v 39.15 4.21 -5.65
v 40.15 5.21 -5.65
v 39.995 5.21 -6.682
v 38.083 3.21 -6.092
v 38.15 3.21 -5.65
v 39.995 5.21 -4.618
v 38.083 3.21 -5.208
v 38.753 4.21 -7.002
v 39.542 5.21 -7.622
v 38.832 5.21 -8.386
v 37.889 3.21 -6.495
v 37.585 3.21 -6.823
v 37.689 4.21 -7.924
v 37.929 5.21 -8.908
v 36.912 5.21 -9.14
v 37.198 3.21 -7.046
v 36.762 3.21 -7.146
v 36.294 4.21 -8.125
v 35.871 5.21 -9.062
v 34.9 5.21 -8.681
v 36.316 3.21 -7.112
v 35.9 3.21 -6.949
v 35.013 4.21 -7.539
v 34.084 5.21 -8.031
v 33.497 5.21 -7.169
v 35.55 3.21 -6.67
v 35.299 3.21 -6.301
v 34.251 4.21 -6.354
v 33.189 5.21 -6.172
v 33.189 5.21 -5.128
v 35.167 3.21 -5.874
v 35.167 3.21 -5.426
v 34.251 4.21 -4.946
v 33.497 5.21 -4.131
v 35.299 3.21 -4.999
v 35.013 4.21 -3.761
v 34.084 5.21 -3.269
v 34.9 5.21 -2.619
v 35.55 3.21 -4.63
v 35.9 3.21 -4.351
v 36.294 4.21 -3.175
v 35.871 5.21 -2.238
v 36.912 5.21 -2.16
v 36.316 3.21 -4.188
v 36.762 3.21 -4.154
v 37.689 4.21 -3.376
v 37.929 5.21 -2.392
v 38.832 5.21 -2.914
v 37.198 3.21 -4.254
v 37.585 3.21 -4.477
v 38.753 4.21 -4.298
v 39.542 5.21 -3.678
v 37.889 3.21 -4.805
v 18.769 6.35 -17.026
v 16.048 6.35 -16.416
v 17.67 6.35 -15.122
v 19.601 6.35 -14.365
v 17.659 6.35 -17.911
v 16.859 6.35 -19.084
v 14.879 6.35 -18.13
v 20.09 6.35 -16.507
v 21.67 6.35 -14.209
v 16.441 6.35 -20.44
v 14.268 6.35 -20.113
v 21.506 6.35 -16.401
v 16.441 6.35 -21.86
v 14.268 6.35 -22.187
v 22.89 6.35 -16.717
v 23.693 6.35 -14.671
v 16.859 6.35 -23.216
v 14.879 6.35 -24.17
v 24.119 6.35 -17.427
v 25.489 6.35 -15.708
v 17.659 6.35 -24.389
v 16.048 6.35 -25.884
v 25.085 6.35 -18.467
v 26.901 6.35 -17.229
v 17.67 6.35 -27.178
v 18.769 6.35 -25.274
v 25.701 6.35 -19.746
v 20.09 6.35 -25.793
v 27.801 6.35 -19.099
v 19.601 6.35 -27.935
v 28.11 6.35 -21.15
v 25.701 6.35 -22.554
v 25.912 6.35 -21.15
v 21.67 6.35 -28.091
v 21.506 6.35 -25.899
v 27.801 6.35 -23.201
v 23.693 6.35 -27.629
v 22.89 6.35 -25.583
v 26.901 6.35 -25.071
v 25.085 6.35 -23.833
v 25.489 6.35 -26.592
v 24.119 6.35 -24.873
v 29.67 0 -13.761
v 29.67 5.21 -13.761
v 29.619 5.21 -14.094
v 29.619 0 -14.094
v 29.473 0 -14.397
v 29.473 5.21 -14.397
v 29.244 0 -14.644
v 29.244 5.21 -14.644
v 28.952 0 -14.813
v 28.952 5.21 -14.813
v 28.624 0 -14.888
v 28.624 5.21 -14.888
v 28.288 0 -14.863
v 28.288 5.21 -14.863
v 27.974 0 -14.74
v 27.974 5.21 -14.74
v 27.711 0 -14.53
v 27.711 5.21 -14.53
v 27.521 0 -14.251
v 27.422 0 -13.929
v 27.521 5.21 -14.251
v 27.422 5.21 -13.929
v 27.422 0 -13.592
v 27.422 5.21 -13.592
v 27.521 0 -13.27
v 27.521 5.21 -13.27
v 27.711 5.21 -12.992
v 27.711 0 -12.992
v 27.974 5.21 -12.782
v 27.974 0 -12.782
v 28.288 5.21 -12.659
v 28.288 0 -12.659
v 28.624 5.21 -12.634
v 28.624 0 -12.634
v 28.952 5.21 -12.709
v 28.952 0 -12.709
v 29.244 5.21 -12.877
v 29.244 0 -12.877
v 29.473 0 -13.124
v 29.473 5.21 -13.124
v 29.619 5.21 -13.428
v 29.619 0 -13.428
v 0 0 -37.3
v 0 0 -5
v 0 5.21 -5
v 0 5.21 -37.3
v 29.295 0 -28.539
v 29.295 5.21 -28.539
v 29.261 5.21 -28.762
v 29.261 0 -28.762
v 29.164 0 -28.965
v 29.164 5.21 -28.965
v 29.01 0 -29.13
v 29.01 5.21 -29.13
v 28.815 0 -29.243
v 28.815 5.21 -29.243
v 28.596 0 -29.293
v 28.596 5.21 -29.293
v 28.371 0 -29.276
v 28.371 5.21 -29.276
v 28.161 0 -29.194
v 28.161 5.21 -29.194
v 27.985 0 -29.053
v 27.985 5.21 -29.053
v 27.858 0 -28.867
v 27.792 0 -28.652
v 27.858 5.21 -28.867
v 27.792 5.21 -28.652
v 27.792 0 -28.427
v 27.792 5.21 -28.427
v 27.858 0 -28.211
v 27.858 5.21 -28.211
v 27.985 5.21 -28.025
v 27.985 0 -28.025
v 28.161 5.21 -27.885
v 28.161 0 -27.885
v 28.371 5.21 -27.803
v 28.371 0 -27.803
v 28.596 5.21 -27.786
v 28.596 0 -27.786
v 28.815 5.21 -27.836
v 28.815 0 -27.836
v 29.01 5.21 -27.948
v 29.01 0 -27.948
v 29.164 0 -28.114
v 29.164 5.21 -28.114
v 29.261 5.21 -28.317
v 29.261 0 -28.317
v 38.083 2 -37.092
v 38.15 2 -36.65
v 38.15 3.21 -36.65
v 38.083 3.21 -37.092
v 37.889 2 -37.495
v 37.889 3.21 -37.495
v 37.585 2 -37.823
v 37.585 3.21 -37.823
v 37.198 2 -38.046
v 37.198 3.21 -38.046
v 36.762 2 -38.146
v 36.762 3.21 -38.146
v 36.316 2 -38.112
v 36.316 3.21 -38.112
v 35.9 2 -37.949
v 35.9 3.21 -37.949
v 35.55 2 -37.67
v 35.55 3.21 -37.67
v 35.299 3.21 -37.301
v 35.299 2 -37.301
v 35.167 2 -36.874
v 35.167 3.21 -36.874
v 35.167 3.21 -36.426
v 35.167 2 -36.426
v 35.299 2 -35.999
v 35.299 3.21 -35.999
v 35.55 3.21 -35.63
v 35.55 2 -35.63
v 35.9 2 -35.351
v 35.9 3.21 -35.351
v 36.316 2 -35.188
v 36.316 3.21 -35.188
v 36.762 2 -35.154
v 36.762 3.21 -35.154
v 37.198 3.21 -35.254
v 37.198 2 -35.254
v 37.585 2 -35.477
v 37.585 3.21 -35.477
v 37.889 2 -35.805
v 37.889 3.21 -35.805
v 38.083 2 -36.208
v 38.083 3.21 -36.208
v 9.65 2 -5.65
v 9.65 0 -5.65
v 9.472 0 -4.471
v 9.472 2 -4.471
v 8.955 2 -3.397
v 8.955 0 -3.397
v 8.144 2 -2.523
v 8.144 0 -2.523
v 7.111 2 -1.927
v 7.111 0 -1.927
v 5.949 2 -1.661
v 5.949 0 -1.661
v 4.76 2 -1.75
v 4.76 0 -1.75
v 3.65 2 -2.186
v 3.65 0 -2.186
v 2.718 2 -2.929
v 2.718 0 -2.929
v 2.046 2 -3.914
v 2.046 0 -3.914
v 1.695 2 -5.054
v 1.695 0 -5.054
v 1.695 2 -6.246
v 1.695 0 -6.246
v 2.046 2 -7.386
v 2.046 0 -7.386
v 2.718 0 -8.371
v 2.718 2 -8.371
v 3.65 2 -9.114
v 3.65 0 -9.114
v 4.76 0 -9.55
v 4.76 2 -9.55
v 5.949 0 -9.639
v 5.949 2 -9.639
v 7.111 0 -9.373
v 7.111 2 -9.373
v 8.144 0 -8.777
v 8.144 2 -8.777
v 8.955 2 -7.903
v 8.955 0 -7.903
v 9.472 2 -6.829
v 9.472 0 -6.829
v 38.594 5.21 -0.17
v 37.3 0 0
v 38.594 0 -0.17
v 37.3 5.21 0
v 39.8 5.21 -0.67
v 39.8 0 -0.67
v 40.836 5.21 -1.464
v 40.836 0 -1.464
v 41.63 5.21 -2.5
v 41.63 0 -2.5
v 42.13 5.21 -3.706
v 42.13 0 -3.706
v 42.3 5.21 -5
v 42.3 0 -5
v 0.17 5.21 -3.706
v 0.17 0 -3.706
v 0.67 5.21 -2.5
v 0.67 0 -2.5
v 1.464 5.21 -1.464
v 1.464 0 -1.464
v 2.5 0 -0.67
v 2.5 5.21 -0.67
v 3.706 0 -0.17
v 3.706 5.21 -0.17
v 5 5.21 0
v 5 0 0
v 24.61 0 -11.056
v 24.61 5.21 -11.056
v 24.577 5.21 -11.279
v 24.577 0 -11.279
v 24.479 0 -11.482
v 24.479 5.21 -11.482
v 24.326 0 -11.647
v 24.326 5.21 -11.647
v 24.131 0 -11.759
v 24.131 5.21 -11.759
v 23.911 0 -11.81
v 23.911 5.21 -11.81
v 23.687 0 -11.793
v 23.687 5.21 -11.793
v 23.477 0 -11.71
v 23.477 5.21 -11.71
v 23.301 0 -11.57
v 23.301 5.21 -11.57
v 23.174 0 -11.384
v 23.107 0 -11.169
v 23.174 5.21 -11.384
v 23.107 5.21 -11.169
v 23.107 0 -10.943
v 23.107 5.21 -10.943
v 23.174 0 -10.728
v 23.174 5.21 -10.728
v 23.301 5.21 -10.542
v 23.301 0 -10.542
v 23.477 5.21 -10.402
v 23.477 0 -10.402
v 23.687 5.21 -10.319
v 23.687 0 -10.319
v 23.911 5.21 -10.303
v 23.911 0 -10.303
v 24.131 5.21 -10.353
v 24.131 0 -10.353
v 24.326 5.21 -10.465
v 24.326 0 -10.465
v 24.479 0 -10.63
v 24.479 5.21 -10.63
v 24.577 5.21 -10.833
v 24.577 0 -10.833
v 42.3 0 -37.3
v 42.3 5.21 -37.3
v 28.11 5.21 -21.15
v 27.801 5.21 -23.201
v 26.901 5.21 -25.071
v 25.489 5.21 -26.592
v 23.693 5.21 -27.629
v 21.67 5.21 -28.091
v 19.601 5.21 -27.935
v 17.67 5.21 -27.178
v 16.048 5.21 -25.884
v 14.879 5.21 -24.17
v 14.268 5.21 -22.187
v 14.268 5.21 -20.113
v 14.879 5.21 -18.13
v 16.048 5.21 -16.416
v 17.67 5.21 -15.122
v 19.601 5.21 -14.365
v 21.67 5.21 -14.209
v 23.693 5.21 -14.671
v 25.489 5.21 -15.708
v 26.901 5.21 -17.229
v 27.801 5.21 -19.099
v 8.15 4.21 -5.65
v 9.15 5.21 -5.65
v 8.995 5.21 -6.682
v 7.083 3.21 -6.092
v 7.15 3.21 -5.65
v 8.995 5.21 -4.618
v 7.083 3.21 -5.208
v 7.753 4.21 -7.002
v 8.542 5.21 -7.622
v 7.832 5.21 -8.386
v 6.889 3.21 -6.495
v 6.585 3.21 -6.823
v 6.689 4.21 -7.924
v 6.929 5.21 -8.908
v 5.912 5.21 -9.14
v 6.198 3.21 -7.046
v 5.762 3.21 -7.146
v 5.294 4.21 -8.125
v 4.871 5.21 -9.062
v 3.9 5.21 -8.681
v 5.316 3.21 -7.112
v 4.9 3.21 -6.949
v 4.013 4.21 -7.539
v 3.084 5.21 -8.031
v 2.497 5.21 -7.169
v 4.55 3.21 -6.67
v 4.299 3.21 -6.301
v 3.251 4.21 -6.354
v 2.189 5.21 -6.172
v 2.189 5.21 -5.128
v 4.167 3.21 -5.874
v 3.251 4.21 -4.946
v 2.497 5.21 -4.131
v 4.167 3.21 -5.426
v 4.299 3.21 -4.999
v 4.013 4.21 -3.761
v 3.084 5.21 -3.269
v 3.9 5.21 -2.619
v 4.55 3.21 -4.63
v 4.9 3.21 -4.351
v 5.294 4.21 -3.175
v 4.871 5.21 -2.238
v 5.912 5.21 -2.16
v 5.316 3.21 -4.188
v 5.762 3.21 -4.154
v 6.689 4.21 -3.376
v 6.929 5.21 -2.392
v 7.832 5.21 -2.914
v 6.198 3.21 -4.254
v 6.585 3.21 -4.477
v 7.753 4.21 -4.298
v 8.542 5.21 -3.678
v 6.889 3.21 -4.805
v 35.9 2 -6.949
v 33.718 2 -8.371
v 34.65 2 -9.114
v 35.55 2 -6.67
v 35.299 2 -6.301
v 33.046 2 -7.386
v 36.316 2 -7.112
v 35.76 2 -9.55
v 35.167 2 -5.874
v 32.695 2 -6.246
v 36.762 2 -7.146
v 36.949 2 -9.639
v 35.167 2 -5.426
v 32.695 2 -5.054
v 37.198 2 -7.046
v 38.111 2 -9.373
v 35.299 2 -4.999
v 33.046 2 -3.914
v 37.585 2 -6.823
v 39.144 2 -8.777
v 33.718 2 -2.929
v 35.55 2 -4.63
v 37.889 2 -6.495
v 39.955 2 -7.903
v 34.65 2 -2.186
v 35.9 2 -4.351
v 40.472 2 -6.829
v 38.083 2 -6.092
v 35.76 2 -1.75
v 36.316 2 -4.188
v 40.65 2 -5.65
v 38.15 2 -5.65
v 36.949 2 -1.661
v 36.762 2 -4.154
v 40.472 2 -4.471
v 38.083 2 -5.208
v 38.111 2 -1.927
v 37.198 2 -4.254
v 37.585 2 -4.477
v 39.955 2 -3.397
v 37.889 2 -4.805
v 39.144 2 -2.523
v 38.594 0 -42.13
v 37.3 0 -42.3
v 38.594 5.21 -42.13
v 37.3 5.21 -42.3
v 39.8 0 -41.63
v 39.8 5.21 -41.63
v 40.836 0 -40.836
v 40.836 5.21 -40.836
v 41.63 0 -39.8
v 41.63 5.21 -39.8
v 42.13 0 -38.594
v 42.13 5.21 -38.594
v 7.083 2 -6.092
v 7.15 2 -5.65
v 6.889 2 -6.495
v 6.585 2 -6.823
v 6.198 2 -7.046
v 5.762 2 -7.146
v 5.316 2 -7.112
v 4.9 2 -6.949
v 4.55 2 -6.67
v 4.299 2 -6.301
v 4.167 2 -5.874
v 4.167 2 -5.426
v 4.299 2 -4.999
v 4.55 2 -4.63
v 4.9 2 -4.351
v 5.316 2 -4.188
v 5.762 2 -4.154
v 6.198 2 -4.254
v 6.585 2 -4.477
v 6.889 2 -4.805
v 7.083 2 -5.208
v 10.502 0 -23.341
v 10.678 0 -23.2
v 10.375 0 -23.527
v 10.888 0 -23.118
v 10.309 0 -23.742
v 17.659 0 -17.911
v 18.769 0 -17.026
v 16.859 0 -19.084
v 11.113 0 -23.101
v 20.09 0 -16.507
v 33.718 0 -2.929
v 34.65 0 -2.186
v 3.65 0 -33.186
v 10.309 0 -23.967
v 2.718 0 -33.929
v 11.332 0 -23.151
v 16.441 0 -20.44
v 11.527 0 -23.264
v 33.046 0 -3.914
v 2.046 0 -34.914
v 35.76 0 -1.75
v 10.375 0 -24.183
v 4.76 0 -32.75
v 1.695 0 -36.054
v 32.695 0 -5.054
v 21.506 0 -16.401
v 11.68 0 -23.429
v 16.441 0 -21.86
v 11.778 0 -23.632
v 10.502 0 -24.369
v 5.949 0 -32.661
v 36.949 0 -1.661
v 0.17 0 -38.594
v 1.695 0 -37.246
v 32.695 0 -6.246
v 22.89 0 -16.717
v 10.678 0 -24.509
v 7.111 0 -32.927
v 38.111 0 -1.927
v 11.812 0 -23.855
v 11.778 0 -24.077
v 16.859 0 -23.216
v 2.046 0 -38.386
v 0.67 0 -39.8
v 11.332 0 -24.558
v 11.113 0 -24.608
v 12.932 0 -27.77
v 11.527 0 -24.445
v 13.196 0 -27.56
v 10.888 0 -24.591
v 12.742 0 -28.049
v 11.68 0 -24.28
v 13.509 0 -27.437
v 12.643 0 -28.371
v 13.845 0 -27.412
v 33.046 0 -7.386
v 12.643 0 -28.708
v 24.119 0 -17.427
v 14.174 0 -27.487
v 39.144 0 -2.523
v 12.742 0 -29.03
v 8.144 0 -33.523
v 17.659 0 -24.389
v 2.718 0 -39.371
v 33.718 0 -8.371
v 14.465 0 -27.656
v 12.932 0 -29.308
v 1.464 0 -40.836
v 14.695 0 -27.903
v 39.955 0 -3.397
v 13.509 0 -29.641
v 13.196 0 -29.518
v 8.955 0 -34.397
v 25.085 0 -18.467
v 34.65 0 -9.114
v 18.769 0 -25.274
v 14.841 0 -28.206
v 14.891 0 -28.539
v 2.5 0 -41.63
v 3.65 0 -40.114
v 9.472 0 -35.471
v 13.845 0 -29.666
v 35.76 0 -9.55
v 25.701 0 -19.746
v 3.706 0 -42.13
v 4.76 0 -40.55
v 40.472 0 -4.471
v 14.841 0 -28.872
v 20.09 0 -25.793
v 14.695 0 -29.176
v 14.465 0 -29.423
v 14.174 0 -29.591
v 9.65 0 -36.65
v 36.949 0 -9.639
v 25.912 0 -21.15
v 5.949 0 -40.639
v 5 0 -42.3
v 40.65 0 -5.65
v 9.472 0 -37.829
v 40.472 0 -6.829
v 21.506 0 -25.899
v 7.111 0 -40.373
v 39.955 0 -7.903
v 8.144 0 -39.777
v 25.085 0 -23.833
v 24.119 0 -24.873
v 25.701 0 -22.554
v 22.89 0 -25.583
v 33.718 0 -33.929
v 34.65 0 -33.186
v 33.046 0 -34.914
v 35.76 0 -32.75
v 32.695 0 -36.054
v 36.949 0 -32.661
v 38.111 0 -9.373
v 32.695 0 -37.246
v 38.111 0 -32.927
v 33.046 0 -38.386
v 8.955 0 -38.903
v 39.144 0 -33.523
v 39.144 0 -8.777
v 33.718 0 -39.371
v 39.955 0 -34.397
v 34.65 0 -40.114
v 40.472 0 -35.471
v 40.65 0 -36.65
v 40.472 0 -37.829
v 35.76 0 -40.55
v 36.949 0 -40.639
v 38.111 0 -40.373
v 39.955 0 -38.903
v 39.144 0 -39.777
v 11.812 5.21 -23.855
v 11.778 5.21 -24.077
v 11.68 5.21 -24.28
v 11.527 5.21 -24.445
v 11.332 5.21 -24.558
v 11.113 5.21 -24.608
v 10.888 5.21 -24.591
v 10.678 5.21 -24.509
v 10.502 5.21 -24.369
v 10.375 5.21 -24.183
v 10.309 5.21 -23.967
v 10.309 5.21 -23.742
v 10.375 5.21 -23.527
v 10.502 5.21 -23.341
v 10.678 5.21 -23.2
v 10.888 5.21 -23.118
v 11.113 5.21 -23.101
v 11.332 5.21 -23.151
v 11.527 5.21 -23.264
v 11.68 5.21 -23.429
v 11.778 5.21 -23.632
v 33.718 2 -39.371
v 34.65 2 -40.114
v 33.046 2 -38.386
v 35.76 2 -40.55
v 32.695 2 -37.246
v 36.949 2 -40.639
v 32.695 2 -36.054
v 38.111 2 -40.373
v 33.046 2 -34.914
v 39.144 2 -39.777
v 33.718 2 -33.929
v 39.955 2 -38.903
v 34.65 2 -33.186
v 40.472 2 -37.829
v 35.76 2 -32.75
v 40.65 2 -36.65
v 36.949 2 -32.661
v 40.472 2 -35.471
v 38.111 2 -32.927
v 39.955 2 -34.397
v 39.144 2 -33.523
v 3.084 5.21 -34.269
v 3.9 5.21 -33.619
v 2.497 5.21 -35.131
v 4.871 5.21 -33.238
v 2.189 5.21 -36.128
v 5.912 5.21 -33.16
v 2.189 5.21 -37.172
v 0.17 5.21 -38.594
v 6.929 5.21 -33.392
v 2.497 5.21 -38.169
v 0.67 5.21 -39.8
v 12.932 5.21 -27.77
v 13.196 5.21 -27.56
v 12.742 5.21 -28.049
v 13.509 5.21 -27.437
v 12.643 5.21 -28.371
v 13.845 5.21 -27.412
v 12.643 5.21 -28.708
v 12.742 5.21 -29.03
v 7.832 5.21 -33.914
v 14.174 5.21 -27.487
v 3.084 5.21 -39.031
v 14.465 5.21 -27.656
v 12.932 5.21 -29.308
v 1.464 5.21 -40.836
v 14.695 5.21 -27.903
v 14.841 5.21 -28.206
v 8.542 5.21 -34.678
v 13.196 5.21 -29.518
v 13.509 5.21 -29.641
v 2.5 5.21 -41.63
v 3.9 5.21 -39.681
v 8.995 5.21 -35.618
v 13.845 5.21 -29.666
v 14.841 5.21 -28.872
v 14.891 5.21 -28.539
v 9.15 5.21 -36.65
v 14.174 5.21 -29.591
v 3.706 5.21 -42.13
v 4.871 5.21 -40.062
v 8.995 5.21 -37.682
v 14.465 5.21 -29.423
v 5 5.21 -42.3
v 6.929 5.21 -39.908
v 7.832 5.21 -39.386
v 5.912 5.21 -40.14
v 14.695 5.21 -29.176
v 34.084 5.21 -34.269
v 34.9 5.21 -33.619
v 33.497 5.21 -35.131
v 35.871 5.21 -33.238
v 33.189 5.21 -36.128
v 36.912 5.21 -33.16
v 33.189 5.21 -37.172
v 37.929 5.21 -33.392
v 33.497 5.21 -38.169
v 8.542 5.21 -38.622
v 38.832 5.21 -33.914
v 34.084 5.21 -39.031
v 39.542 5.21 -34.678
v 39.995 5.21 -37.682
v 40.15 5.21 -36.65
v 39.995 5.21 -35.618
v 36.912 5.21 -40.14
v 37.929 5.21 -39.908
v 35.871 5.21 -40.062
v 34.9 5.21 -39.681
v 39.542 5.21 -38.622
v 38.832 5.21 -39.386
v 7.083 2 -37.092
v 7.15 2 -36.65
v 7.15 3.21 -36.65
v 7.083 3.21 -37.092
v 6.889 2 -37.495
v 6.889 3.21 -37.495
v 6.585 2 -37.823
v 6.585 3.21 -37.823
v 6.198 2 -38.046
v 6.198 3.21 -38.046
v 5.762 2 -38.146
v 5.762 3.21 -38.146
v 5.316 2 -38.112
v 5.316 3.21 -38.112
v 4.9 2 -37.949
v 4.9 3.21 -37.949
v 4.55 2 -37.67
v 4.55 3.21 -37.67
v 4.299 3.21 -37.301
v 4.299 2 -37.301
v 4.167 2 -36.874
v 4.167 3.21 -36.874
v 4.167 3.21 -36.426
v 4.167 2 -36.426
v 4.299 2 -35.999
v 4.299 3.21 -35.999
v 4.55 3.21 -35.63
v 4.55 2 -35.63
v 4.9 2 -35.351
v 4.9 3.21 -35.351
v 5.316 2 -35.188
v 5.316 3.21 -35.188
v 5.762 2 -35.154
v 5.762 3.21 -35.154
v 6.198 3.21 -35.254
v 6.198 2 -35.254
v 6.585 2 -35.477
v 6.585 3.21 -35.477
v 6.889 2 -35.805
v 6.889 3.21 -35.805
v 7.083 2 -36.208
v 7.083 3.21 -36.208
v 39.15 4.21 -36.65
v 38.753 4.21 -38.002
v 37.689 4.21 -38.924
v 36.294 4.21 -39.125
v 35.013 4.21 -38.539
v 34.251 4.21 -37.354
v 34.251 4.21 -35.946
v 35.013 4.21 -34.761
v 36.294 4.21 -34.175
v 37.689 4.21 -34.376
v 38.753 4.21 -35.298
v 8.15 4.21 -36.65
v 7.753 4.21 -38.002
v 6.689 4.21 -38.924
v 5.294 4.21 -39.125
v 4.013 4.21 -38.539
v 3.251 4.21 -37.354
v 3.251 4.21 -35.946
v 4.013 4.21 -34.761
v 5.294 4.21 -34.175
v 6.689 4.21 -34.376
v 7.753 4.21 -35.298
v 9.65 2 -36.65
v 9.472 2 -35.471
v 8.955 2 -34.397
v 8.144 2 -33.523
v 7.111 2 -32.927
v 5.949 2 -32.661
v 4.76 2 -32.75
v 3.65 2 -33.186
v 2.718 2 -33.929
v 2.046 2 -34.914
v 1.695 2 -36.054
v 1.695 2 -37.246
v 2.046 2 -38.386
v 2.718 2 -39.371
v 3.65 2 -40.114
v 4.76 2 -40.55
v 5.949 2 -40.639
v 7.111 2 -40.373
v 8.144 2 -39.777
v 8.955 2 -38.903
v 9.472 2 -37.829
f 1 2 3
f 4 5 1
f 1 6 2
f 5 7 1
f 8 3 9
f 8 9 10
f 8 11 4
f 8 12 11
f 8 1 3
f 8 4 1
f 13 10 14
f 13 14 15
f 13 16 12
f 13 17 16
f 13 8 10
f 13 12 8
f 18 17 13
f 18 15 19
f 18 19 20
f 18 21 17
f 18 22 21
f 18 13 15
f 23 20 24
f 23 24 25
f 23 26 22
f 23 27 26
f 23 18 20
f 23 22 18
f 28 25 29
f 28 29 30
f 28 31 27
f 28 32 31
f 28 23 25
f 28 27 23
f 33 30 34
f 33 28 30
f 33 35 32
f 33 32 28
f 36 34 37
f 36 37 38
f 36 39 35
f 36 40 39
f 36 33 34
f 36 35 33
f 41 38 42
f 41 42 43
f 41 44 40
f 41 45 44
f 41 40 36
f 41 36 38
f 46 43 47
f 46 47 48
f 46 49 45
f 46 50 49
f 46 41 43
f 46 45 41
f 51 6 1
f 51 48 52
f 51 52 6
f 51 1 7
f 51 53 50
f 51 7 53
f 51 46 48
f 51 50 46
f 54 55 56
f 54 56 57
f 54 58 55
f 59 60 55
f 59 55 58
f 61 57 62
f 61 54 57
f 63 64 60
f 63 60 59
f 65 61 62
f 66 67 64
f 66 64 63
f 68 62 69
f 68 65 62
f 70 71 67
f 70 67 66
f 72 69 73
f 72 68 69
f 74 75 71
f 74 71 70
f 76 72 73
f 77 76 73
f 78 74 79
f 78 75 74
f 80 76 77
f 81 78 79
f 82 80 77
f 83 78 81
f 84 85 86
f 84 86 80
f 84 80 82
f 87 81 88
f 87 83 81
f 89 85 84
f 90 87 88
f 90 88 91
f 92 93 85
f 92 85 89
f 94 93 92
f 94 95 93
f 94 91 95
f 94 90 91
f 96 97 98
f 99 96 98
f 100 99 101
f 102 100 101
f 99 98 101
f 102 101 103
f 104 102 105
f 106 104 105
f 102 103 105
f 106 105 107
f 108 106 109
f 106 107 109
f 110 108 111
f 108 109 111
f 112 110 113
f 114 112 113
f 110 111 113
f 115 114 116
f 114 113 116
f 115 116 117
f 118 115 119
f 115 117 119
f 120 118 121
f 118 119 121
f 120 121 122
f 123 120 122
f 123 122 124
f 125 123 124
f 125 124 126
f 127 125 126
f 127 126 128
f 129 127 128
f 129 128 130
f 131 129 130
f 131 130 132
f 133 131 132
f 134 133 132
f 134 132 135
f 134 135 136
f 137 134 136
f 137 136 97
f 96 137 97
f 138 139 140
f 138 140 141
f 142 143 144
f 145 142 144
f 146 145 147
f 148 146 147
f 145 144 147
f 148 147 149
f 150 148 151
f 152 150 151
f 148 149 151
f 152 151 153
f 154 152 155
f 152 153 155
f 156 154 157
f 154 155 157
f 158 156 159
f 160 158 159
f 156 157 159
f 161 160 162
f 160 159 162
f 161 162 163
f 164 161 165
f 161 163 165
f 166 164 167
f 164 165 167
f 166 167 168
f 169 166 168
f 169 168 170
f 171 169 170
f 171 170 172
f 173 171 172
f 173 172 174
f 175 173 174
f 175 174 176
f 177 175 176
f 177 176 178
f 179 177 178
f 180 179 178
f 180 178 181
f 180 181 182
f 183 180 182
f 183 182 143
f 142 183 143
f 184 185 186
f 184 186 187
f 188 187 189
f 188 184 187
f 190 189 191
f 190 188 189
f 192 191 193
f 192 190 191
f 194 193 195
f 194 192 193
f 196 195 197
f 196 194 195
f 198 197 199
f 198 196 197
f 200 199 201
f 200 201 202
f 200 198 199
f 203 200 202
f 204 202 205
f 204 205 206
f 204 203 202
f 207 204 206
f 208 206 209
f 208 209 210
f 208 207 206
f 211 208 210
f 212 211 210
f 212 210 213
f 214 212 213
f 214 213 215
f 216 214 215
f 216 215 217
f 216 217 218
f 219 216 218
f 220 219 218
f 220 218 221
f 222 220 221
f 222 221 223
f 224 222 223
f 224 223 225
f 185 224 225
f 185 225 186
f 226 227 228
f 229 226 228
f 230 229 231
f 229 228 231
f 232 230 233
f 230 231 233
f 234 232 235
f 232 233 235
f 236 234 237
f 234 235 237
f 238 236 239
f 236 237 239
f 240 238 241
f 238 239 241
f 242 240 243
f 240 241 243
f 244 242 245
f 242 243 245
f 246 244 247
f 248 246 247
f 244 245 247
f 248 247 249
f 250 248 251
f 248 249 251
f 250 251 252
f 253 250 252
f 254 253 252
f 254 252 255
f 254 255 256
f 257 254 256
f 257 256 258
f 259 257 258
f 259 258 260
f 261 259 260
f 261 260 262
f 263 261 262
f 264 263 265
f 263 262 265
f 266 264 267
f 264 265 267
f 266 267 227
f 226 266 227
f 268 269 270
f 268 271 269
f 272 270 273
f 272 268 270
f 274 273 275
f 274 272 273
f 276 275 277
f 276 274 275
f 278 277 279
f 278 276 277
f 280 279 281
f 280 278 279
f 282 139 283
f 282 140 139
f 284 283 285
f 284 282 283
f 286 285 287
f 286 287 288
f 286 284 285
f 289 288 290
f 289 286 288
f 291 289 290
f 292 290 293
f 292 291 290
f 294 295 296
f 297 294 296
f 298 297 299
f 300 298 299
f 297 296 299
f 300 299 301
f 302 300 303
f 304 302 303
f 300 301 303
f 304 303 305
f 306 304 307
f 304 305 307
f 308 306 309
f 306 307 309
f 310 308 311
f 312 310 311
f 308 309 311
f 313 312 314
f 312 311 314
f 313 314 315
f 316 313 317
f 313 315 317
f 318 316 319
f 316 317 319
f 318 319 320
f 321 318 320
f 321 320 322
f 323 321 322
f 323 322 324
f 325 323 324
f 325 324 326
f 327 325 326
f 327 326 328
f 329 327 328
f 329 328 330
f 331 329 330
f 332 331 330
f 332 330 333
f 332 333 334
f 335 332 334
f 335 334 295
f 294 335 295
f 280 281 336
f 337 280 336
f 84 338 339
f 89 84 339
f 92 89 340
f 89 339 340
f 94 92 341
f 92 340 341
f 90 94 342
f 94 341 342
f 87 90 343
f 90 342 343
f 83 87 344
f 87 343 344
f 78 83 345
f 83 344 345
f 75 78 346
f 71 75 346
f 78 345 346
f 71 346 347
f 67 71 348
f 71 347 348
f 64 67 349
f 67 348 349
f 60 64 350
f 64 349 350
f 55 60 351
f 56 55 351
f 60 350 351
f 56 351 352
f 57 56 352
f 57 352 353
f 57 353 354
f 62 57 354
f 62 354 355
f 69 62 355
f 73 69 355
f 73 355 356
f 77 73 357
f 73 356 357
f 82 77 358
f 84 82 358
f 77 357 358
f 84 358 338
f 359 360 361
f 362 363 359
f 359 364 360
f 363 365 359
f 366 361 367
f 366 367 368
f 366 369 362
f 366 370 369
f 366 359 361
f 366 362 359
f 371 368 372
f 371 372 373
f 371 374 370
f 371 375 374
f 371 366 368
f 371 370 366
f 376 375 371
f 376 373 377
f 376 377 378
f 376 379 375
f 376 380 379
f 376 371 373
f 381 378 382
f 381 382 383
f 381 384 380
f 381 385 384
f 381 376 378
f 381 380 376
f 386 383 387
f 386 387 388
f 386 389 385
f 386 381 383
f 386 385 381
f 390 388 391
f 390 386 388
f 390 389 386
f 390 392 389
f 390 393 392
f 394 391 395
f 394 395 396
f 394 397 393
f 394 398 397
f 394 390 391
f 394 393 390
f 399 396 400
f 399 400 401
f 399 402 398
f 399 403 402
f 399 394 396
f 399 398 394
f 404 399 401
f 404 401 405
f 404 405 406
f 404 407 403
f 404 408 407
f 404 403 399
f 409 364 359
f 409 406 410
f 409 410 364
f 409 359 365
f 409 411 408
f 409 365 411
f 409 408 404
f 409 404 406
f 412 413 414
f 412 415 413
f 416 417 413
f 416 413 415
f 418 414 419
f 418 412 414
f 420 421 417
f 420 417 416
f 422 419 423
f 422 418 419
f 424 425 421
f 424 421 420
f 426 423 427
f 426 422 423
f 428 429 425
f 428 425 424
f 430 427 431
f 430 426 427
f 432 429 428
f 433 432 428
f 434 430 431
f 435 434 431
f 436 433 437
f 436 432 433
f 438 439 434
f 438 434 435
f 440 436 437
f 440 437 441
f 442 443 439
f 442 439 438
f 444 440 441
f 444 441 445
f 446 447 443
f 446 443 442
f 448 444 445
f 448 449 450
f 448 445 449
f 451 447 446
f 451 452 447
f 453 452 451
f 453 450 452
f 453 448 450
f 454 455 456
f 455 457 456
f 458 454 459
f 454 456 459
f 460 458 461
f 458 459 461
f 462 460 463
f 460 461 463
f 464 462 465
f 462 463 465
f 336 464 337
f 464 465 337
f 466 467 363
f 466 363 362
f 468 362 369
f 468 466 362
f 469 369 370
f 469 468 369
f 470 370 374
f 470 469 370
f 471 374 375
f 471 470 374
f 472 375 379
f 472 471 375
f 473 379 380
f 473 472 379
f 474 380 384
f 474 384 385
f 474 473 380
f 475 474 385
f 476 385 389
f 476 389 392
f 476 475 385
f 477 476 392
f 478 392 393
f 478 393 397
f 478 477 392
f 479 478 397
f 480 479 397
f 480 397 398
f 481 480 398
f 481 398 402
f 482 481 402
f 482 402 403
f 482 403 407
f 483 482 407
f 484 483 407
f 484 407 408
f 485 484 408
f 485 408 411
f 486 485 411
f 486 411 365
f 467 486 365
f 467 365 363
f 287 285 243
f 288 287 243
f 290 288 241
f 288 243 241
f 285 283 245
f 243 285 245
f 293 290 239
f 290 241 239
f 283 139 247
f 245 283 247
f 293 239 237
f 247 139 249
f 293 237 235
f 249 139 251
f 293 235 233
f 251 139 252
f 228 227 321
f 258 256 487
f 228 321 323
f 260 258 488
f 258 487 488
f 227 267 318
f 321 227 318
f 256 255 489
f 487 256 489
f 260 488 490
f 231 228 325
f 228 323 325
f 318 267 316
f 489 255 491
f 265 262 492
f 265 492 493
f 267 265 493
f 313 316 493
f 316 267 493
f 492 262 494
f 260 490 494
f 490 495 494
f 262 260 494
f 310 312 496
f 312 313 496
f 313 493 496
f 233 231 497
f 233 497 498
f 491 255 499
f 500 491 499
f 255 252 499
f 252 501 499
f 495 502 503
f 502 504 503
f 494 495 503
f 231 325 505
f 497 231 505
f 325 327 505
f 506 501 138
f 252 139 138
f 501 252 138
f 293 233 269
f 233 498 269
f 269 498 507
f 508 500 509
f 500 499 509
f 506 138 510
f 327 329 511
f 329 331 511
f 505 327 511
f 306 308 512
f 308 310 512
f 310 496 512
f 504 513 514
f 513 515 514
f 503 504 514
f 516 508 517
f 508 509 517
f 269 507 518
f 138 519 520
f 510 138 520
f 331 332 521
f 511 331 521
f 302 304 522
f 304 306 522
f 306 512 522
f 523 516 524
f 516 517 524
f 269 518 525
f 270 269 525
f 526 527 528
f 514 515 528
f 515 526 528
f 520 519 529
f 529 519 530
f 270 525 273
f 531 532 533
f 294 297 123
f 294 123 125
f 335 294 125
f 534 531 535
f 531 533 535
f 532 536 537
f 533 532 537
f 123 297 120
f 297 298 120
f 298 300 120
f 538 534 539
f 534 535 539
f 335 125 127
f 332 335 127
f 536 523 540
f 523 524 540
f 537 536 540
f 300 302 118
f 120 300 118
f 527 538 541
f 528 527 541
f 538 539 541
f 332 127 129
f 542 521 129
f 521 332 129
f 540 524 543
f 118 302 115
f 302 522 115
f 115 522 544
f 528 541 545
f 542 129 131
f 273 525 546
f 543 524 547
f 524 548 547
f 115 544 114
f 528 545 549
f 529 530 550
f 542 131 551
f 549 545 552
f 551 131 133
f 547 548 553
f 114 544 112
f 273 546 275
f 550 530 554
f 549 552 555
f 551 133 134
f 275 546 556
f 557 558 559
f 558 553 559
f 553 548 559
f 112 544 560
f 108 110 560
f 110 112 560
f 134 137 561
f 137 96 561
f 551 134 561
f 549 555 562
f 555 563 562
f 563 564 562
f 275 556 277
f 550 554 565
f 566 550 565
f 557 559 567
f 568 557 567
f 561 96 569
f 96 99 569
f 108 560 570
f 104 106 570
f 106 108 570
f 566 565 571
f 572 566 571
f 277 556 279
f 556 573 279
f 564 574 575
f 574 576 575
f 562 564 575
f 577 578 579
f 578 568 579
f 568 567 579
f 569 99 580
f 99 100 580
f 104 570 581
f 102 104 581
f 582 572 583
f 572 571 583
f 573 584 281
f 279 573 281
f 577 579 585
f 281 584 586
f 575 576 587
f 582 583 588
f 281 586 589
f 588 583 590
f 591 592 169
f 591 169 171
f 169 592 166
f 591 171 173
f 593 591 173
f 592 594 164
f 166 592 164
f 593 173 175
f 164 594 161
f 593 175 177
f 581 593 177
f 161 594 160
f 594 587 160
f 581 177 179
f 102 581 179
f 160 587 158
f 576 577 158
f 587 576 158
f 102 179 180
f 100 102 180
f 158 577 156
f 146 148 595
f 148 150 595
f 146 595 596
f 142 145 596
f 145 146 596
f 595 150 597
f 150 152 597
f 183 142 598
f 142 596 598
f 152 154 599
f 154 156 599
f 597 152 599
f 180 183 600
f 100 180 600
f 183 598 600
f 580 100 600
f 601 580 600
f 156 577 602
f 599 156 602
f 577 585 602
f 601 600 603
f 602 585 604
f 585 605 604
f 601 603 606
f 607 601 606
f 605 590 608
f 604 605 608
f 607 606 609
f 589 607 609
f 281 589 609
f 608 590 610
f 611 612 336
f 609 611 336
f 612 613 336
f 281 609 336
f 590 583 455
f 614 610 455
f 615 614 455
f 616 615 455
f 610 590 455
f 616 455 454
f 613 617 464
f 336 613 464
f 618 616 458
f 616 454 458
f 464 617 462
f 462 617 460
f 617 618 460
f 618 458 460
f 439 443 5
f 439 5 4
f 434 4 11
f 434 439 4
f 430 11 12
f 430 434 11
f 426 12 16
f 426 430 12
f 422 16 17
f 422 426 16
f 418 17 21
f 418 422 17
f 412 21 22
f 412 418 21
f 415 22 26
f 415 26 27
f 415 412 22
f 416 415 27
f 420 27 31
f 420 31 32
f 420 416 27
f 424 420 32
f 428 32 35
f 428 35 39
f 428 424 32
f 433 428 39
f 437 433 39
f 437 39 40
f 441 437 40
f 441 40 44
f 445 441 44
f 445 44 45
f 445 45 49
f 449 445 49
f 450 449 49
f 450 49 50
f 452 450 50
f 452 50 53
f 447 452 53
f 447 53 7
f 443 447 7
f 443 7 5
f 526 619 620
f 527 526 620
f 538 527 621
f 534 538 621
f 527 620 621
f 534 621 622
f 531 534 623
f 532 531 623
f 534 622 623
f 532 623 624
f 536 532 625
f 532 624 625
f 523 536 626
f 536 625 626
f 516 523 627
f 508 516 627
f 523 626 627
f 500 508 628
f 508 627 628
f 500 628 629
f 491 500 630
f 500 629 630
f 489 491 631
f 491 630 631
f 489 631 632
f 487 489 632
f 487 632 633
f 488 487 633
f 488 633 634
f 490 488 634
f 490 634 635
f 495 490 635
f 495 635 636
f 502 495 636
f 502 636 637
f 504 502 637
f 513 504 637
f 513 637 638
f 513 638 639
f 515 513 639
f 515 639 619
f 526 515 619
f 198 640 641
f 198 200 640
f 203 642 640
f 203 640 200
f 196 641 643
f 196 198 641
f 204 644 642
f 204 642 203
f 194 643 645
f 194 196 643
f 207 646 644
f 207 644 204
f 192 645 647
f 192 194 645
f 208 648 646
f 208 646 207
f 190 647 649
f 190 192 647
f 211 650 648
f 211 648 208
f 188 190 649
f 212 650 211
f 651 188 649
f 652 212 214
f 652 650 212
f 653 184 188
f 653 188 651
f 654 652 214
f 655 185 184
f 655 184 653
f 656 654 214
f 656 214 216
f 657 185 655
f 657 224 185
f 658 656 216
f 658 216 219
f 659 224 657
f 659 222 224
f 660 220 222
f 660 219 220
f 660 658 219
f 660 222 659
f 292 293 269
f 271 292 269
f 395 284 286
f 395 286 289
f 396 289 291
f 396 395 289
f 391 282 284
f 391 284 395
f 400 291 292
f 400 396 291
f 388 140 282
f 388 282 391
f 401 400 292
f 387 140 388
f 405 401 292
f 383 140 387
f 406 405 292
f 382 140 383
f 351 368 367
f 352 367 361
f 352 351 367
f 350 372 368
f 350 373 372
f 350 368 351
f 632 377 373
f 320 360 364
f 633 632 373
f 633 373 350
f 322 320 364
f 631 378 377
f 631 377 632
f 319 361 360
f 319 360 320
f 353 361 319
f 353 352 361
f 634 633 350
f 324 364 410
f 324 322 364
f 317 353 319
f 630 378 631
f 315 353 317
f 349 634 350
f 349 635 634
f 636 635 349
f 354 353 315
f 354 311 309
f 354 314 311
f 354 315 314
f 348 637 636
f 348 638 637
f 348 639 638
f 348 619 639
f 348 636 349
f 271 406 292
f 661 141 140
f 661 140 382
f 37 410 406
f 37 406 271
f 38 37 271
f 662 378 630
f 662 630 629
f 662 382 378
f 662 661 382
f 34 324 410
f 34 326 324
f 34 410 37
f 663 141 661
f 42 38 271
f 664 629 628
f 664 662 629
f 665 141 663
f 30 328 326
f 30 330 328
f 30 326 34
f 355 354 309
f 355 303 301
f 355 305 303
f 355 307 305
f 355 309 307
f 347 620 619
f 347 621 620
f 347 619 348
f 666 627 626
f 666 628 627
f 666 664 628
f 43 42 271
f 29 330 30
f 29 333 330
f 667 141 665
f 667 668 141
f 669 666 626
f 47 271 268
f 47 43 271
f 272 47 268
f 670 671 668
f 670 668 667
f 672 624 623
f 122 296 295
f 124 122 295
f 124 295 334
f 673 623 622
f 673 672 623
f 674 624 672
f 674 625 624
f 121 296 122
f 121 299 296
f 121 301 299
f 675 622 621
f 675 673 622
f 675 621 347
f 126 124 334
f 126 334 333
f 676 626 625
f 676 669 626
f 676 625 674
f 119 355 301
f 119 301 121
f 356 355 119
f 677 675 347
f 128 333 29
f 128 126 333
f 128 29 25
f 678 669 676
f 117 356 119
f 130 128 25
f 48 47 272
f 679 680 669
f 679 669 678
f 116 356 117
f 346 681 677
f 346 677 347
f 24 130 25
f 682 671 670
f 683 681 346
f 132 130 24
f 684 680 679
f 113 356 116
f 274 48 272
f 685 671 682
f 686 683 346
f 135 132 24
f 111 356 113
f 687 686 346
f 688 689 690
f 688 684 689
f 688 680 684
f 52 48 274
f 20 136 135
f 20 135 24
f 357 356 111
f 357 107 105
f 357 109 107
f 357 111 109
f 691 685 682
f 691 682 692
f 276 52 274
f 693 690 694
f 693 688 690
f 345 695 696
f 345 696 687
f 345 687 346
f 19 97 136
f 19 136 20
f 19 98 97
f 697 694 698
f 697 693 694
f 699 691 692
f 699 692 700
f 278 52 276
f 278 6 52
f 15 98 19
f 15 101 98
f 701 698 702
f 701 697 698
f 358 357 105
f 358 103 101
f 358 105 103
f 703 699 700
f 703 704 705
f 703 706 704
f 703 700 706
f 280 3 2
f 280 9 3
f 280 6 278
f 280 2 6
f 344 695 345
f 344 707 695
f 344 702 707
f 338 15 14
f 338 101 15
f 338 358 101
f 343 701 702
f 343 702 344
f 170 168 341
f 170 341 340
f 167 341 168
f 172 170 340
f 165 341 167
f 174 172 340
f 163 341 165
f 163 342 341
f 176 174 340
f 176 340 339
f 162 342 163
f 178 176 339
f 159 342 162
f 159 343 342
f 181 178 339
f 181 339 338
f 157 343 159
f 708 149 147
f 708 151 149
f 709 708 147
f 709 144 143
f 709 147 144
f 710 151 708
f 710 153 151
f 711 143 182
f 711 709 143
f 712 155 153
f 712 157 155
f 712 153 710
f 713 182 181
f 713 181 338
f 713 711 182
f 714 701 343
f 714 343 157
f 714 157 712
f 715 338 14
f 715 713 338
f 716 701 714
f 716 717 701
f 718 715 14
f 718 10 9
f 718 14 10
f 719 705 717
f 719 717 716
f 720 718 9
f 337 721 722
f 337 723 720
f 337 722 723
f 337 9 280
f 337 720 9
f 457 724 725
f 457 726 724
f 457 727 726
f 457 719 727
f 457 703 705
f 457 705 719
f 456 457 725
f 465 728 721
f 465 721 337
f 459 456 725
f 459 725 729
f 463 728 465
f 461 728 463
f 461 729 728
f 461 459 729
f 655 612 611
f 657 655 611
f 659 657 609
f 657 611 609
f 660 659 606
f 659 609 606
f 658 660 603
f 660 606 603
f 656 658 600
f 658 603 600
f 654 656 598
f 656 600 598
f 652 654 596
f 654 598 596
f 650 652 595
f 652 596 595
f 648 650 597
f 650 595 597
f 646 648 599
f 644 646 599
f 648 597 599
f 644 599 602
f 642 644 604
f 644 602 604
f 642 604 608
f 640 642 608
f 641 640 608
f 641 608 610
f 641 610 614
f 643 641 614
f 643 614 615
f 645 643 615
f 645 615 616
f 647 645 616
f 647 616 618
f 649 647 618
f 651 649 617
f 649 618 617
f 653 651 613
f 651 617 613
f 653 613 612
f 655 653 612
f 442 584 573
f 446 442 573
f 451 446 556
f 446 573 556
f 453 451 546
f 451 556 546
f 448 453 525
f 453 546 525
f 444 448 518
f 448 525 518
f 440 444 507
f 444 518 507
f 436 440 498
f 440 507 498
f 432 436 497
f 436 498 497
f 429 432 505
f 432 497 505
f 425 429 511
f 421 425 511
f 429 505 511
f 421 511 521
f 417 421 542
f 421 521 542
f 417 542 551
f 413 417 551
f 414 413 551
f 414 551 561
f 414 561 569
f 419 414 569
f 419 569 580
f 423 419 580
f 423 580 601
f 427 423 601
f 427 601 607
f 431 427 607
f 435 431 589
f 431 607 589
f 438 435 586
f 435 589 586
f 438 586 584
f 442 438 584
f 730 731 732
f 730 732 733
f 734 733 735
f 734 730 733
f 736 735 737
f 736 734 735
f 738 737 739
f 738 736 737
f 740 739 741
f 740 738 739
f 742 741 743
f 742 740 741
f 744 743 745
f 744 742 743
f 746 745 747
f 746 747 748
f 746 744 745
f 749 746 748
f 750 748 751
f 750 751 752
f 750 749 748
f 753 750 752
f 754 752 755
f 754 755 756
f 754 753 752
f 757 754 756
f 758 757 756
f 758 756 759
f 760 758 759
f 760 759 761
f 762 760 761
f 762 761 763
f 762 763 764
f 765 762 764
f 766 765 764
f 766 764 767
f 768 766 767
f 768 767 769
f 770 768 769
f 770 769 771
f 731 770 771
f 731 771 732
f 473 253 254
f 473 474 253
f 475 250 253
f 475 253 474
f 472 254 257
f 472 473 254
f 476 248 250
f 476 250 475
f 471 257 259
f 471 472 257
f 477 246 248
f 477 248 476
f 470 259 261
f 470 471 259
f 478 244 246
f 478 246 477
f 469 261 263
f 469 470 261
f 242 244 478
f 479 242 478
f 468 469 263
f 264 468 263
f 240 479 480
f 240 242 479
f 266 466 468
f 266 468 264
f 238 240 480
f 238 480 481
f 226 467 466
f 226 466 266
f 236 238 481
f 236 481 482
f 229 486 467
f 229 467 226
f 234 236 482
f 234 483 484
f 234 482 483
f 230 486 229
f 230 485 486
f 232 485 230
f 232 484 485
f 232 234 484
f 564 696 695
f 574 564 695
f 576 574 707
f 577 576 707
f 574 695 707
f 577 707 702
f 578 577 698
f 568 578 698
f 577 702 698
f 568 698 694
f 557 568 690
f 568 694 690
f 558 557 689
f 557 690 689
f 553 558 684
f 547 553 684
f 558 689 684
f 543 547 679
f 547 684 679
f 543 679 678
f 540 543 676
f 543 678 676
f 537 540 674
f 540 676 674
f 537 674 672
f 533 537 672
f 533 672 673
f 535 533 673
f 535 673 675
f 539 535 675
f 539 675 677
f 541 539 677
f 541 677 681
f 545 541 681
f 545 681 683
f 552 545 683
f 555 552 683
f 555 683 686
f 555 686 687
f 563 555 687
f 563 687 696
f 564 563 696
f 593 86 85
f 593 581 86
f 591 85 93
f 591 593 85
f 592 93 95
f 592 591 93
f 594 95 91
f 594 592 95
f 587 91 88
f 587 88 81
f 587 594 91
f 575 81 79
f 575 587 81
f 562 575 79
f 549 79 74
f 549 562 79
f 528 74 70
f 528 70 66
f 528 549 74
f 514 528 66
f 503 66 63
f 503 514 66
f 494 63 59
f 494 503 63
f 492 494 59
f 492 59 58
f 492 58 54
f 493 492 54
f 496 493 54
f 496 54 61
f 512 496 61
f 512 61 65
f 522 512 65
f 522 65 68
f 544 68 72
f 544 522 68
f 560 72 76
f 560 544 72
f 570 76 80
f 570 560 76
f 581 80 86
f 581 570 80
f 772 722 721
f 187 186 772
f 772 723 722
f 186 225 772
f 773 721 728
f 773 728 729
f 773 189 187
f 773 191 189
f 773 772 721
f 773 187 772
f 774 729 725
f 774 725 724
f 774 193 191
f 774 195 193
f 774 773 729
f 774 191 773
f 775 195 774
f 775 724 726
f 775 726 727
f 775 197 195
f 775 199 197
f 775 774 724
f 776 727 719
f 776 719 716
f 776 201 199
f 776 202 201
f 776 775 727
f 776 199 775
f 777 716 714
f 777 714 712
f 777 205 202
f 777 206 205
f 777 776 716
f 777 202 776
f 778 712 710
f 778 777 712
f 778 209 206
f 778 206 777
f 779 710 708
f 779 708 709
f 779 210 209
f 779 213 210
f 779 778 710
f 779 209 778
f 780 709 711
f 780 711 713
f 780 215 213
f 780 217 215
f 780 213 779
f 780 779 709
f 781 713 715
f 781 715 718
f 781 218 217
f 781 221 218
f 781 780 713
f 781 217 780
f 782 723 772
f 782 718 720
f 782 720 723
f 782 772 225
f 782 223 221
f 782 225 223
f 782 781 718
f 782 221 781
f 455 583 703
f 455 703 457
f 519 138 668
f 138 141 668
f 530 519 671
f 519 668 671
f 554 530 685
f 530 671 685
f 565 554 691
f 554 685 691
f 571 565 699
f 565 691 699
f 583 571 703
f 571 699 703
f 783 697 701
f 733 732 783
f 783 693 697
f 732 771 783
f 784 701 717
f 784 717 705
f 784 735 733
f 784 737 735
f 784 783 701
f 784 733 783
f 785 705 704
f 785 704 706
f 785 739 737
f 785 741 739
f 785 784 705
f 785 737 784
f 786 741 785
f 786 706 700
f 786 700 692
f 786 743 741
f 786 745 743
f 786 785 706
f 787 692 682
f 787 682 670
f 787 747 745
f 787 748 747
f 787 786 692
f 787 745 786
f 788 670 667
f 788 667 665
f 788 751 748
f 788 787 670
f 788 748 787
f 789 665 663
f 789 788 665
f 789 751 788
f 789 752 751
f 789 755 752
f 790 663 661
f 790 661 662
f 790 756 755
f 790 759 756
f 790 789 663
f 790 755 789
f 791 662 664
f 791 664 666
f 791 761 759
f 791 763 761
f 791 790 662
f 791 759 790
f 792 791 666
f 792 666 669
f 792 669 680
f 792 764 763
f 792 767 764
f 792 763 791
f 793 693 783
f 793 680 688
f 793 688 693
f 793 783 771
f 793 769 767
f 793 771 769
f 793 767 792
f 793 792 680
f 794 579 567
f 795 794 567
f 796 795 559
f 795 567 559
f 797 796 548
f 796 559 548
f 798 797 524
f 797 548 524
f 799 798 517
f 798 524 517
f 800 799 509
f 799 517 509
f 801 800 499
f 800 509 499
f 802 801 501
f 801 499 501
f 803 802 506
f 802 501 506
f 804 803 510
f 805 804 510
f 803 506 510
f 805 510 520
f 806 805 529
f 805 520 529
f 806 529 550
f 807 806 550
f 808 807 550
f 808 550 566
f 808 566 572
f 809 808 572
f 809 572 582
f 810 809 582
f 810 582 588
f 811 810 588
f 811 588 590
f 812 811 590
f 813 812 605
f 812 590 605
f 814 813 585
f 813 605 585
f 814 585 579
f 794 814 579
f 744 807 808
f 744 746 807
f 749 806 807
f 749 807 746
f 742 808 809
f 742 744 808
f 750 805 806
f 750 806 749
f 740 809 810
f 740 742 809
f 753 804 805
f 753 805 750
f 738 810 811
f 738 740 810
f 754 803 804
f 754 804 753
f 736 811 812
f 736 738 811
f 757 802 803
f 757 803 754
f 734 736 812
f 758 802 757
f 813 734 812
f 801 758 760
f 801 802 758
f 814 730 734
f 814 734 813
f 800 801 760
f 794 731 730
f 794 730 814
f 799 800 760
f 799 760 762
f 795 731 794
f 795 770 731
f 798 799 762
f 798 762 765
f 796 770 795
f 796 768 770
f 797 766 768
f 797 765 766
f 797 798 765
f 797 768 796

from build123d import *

# Parameters (mm, degrees)
SKETCH1_W           = 42.3
SKETCH1_H           = 42.3
SKETCH1_R           = 1.5
SKETCH1_R_2         = 4.7625
BOSS_EXTRUDE1_DEPTH = 5.21
SKETCH2_R           = 0.75565
SKETCH2_R_2         = 1.1303
CUT_EXTRUDE1_DEPTH  = 6.21
CHAMFER1_SIZE       = 2
SKETCH4_R           = 6.96
SKETCH4_R_2         = 4.7625
BOSS_EXTRUDE2_DEPTH = 1.14
SKETCH5_R           = 4
SKETCH5_R_2         = 1.5
CUT_EXTRUDE2_DEPTH  = 2
FILLET1_R           = 5


with BuildPart() as part:
    # Sketch1 → Boss-Extrude1 (new body)
    with BuildSketch(Plane(origin=(0, 0, 0), x_dir=(1, 0, 0), z_dir=(0, 1, 0))):
        with Locations((21.15, 21.15)):
            Rectangle(SKETCH1_W, SKETCH1_H)
        with Locations((36.65, 36.65)):
            Circle(SKETCH1_R, mode=Mode.SUBTRACT)
        with Locations((5.65, 5.65)):
            Circle(SKETCH1_R, mode=Mode.SUBTRACT)
        with Locations((36.65, 5.65)):
            Circle(SKETCH1_R, mode=Mode.SUBTRACT)
        with Locations((5.65, 36.65)):
            Circle(SKETCH1_R, mode=Mode.SUBTRACT)
        with Locations((21.15, 21.15)):
            Circle(SKETCH1_R_2, mode=Mode.SUBTRACT)
    extrude(amount=BOSS_EXTRUDE1_DEPTH)

    # Sketch2 → Cut-Extrude1 (cut, through all)
    with BuildSketch(Plane(origin=(0, 5.21, 0), x_dir=(1, 0, 0), z_dir=(0, 1, 0))):
        with Locations((11.056075115, 23.854659021)):
            Circle(SKETCH2_R)
        with Locations((28.539265863, 28.539265863)):
            Circle(SKETCH2_R)
        with Locations((23.854659021, 11.056075115)):
            Circle(SKETCH2_R)
        with Locations((28.539265863, 13.760734137)):
            Circle(SKETCH2_R_2)
        with Locations((13.760734137, 28.539265863)):
            Circle(SKETCH2_R_2)
    extrude(amount=-CUT_EXTRUDE1_DEPTH, mode=Mode.SUBTRACT)

    # Chamfer1
    chamfer1_edges = [part.edges().sort_by_distance(p)[0] for p in [
        (35.15, 5.21, -36.65),
        (4.15, 5.21, -5.65),
        (35.15, 5.21, -5.65),
        (4.15, 5.21, -36.65),
    ]]
    chamfer(chamfer1_edges, length=CHAMFER1_SIZE)

    # Sketch4 → Boss-Extrude2 (add)
    with BuildSketch(Plane(origin=(0, 5.21, 0), x_dir=(1, 0, 0), z_dir=(0, 1, 0))):
        with Locations((21.15, 21.15)):
            Circle(SKETCH4_R)
        with Locations((21.15, 21.15)):
            Circle(SKETCH4_R_2, mode=Mode.SUBTRACT)
    extrude(amount=BOSS_EXTRUDE2_DEPTH)

    # Sketch5 → Cut-Extrude2 (cut)
    with BuildSketch(Plane.XZ):
        with Locations((36.65, -36.65)):
            Circle(SKETCH5_R)
        with Locations((36.65, -36.65)):
            Circle(SKETCH5_R_2, mode=Mode.SUBTRACT)
        with Locations((5.65, -36.65)):
            Circle(SKETCH5_R)
        with Locations((5.65, -36.65)):
            Circle(SKETCH5_R_2, mode=Mode.SUBTRACT)
        with Locations((5.65, -5.65)):
            Circle(SKETCH5_R)
        with Locations((5.65, -5.65)):
            Circle(SKETCH5_R_2, mode=Mode.SUBTRACT)
        with Locations((36.65, -5.65)):
            Circle(SKETCH5_R)
        with Locations((36.65, -5.65)):
            Circle(SKETCH5_R_2, mode=Mode.SUBTRACT)
    extrude(amount=-CUT_EXTRUDE2_DEPTH, mode=Mode.SUBTRACT)

    # Fillet1
    fillet1_edges = [part.edges().sort_by_distance(p)[0] for p in [
        (0, 2.605, -42.3),
        (42.3, 2.605, -42.3),
        (42.3, 2.605, 0),
        (0, 2.605, 0),
    ]]
    fillet(fillet1_edges, radius=FILLET1_R)


solid = part.part
